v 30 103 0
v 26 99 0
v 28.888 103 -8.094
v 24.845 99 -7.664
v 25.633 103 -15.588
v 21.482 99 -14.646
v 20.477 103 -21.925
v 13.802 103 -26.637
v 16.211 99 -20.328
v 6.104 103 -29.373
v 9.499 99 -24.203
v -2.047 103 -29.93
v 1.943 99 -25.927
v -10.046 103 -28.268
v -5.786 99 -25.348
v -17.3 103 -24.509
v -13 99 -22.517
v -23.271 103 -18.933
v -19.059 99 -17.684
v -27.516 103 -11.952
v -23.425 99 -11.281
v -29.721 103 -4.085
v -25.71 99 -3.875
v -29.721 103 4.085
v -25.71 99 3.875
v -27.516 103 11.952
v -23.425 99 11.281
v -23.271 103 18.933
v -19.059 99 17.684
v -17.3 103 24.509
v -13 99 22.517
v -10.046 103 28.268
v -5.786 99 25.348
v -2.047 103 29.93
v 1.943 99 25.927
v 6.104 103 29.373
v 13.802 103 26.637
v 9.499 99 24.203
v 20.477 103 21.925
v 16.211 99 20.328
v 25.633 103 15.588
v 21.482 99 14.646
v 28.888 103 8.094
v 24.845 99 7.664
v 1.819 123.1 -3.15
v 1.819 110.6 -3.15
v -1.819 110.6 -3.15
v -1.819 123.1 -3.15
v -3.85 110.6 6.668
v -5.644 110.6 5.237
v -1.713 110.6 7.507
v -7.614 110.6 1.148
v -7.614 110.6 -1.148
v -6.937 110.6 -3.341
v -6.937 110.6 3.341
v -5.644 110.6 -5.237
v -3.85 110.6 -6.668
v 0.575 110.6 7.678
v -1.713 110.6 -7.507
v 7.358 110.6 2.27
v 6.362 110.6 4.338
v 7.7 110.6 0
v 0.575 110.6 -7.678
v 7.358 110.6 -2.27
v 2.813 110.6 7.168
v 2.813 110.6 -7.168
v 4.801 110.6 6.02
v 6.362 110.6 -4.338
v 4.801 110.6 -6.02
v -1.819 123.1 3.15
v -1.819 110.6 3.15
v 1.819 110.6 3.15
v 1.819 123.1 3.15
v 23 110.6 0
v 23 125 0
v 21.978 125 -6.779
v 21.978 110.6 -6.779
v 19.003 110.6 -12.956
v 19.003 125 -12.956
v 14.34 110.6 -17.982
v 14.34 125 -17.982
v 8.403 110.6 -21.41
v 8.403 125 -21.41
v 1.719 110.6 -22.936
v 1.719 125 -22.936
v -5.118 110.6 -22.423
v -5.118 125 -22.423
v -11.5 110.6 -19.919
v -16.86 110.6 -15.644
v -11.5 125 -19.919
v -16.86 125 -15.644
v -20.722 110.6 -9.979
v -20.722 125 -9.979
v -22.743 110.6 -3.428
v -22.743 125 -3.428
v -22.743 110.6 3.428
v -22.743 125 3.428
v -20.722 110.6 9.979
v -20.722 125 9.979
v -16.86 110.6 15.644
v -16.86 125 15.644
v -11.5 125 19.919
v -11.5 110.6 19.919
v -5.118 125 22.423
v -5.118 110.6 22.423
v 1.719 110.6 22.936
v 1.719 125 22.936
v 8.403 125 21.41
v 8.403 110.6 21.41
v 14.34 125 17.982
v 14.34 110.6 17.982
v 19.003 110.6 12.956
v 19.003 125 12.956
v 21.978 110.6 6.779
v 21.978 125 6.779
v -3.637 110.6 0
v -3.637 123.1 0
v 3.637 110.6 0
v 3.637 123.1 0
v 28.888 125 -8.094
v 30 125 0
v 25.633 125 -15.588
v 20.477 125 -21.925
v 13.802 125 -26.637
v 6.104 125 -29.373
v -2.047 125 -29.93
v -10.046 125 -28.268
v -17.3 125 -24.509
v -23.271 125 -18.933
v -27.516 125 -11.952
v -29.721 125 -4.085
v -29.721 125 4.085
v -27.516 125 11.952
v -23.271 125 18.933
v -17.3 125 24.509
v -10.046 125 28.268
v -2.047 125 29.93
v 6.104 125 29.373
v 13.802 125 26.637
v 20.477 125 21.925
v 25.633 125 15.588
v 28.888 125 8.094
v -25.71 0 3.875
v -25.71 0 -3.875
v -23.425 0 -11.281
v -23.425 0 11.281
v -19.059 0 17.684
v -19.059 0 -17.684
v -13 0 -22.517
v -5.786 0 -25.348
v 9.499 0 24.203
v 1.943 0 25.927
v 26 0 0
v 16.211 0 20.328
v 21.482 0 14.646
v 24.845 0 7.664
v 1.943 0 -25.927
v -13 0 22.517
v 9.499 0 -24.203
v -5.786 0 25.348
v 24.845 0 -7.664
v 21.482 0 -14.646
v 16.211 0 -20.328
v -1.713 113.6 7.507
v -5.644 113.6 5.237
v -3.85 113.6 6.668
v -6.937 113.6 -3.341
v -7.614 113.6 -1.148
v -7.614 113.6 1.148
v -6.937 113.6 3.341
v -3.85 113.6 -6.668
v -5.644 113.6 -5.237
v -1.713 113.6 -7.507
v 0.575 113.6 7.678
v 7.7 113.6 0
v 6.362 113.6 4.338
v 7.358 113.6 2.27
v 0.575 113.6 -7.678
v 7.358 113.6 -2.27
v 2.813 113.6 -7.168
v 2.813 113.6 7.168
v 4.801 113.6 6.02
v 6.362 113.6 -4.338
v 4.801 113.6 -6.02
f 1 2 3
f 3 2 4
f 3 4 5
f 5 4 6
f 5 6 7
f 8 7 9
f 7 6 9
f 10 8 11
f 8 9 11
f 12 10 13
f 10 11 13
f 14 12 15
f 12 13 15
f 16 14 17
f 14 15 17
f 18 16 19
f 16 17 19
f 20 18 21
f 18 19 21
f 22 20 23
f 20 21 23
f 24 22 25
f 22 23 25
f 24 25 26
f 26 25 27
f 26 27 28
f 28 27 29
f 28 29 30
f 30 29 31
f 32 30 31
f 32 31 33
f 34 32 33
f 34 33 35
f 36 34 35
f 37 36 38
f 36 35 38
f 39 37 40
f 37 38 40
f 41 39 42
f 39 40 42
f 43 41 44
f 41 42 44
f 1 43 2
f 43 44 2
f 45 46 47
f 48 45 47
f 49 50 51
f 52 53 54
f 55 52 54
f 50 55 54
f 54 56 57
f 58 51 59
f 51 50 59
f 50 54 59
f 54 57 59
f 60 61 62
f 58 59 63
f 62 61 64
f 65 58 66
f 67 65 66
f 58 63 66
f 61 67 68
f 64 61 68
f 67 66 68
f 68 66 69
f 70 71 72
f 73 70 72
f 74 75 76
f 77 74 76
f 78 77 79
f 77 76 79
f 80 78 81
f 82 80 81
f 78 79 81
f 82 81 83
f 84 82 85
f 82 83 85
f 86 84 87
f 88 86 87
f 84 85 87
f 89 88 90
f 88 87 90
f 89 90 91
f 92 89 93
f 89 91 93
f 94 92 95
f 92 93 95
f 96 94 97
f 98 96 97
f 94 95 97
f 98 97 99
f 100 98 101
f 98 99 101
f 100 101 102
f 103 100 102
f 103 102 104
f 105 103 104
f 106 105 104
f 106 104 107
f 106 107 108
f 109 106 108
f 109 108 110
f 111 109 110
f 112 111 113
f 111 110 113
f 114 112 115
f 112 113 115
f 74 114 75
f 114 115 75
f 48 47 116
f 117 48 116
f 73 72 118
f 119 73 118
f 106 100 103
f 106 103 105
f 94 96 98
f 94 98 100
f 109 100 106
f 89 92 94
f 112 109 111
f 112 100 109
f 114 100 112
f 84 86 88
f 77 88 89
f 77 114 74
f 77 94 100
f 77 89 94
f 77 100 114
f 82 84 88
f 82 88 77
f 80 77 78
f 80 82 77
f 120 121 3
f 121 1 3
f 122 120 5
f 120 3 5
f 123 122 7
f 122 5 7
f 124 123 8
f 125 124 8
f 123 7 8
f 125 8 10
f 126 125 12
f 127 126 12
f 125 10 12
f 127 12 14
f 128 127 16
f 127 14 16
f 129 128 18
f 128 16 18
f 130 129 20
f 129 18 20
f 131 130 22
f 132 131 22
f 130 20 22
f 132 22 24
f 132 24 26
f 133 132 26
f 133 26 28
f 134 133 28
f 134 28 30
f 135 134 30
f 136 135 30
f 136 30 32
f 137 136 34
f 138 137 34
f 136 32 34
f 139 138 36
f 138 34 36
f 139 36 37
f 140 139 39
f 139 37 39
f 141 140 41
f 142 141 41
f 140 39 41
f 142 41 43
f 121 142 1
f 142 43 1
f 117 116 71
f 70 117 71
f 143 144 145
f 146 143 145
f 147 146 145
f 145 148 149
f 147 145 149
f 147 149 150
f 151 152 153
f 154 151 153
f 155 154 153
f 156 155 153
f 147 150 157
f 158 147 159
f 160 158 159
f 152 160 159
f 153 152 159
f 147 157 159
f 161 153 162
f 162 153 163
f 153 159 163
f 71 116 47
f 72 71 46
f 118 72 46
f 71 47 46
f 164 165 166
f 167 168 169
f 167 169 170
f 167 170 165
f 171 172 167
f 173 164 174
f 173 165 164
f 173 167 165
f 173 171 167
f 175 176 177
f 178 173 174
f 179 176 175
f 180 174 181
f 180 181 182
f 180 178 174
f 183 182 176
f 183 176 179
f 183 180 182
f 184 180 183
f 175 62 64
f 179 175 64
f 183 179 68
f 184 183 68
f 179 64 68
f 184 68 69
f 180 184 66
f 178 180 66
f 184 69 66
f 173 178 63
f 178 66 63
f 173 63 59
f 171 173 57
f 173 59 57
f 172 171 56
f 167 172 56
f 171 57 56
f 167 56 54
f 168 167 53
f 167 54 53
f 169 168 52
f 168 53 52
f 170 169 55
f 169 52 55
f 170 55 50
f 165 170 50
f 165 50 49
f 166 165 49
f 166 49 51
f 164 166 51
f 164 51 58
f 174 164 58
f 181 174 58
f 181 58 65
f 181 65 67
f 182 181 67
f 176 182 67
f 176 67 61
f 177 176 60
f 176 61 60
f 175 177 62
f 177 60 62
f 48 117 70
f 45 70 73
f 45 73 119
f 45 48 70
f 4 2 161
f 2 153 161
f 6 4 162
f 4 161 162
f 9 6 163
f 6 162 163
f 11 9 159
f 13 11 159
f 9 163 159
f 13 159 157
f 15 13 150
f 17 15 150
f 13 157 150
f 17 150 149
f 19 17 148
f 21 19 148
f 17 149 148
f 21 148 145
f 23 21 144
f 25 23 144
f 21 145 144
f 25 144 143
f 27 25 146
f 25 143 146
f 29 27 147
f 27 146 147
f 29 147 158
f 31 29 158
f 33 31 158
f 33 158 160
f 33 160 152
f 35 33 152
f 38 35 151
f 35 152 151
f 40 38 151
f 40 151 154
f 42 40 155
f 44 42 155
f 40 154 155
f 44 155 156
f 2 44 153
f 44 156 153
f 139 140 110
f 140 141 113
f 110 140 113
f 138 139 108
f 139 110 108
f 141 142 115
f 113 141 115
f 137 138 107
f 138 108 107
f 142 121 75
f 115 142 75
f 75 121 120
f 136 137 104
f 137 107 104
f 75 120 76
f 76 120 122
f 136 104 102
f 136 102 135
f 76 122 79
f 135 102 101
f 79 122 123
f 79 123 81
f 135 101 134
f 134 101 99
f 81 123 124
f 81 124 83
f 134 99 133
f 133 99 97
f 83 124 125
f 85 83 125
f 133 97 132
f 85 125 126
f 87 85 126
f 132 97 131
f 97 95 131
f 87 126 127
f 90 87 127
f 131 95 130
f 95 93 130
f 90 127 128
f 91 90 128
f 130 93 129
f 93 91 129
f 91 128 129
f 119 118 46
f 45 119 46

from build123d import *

# Parameters (mm, degrees)
SKETCH2_R           = 23
CUT_EXTRUDE1_DEPTH  = 14.4
BOSS_EXTRUDE1_DEPTH = 12.5
SKETCH4_R           = 7.7
BOSS_EXTRUDE2_DEPTH = 3


with BuildPart() as part:
    # Sketch1 → Revolve1 (revolve)
    with BuildSketch(Plane.XY):
        Polygon((0, 0), (0, 125), (30, 125), (30, 103), (26, 99), (26, 0), align=None)
    revolve(axis=Axis((0, 0, 0), (0, 1, 0)))

    # Sketch2 → Cut-Extrude1 (cut)
    with BuildSketch(Plane(origin=(0, 125, 0), x_dir=(1, 0, 0), z_dir=(0, 1, 0))):
        Circle(SKETCH2_R)
    extrude(amount=-CUT_EXTRUDE1_DEPTH, mode=Mode.SUBTRACT)


with BuildPart() as body_2:
    # Sketch3 → Boss-Extrude1 (new body)
    with BuildSketch(Plane(origin=(0, 110.6, 0), x_dir=(1, 0, 0), z_dir=(0, 1, 0))):
        Polygon((3.637306696, 0), (1.818653348, 3.15), (-1.818653348, 3.15), (-3.637306696, 0), (-1.818653348, -3.15), (1.818653348, -3.15), align=None)
    extrude(amount=BOSS_EXTRUDE1_DEPTH)


with BuildPart() as body_3:
    # Sketch4 → Boss-Extrude2 (new body)
    with BuildSketch(Plane(origin=(0, 110.6, 0), x_dir=(1, 0, 0), z_dir=(0, 1, 0))):
        Circle(SKETCH4_R)
    extrude(amount=BOSS_EXTRUDE2_DEPTH)


solid = Compound([part.part, body_2.part, body_3.part])
